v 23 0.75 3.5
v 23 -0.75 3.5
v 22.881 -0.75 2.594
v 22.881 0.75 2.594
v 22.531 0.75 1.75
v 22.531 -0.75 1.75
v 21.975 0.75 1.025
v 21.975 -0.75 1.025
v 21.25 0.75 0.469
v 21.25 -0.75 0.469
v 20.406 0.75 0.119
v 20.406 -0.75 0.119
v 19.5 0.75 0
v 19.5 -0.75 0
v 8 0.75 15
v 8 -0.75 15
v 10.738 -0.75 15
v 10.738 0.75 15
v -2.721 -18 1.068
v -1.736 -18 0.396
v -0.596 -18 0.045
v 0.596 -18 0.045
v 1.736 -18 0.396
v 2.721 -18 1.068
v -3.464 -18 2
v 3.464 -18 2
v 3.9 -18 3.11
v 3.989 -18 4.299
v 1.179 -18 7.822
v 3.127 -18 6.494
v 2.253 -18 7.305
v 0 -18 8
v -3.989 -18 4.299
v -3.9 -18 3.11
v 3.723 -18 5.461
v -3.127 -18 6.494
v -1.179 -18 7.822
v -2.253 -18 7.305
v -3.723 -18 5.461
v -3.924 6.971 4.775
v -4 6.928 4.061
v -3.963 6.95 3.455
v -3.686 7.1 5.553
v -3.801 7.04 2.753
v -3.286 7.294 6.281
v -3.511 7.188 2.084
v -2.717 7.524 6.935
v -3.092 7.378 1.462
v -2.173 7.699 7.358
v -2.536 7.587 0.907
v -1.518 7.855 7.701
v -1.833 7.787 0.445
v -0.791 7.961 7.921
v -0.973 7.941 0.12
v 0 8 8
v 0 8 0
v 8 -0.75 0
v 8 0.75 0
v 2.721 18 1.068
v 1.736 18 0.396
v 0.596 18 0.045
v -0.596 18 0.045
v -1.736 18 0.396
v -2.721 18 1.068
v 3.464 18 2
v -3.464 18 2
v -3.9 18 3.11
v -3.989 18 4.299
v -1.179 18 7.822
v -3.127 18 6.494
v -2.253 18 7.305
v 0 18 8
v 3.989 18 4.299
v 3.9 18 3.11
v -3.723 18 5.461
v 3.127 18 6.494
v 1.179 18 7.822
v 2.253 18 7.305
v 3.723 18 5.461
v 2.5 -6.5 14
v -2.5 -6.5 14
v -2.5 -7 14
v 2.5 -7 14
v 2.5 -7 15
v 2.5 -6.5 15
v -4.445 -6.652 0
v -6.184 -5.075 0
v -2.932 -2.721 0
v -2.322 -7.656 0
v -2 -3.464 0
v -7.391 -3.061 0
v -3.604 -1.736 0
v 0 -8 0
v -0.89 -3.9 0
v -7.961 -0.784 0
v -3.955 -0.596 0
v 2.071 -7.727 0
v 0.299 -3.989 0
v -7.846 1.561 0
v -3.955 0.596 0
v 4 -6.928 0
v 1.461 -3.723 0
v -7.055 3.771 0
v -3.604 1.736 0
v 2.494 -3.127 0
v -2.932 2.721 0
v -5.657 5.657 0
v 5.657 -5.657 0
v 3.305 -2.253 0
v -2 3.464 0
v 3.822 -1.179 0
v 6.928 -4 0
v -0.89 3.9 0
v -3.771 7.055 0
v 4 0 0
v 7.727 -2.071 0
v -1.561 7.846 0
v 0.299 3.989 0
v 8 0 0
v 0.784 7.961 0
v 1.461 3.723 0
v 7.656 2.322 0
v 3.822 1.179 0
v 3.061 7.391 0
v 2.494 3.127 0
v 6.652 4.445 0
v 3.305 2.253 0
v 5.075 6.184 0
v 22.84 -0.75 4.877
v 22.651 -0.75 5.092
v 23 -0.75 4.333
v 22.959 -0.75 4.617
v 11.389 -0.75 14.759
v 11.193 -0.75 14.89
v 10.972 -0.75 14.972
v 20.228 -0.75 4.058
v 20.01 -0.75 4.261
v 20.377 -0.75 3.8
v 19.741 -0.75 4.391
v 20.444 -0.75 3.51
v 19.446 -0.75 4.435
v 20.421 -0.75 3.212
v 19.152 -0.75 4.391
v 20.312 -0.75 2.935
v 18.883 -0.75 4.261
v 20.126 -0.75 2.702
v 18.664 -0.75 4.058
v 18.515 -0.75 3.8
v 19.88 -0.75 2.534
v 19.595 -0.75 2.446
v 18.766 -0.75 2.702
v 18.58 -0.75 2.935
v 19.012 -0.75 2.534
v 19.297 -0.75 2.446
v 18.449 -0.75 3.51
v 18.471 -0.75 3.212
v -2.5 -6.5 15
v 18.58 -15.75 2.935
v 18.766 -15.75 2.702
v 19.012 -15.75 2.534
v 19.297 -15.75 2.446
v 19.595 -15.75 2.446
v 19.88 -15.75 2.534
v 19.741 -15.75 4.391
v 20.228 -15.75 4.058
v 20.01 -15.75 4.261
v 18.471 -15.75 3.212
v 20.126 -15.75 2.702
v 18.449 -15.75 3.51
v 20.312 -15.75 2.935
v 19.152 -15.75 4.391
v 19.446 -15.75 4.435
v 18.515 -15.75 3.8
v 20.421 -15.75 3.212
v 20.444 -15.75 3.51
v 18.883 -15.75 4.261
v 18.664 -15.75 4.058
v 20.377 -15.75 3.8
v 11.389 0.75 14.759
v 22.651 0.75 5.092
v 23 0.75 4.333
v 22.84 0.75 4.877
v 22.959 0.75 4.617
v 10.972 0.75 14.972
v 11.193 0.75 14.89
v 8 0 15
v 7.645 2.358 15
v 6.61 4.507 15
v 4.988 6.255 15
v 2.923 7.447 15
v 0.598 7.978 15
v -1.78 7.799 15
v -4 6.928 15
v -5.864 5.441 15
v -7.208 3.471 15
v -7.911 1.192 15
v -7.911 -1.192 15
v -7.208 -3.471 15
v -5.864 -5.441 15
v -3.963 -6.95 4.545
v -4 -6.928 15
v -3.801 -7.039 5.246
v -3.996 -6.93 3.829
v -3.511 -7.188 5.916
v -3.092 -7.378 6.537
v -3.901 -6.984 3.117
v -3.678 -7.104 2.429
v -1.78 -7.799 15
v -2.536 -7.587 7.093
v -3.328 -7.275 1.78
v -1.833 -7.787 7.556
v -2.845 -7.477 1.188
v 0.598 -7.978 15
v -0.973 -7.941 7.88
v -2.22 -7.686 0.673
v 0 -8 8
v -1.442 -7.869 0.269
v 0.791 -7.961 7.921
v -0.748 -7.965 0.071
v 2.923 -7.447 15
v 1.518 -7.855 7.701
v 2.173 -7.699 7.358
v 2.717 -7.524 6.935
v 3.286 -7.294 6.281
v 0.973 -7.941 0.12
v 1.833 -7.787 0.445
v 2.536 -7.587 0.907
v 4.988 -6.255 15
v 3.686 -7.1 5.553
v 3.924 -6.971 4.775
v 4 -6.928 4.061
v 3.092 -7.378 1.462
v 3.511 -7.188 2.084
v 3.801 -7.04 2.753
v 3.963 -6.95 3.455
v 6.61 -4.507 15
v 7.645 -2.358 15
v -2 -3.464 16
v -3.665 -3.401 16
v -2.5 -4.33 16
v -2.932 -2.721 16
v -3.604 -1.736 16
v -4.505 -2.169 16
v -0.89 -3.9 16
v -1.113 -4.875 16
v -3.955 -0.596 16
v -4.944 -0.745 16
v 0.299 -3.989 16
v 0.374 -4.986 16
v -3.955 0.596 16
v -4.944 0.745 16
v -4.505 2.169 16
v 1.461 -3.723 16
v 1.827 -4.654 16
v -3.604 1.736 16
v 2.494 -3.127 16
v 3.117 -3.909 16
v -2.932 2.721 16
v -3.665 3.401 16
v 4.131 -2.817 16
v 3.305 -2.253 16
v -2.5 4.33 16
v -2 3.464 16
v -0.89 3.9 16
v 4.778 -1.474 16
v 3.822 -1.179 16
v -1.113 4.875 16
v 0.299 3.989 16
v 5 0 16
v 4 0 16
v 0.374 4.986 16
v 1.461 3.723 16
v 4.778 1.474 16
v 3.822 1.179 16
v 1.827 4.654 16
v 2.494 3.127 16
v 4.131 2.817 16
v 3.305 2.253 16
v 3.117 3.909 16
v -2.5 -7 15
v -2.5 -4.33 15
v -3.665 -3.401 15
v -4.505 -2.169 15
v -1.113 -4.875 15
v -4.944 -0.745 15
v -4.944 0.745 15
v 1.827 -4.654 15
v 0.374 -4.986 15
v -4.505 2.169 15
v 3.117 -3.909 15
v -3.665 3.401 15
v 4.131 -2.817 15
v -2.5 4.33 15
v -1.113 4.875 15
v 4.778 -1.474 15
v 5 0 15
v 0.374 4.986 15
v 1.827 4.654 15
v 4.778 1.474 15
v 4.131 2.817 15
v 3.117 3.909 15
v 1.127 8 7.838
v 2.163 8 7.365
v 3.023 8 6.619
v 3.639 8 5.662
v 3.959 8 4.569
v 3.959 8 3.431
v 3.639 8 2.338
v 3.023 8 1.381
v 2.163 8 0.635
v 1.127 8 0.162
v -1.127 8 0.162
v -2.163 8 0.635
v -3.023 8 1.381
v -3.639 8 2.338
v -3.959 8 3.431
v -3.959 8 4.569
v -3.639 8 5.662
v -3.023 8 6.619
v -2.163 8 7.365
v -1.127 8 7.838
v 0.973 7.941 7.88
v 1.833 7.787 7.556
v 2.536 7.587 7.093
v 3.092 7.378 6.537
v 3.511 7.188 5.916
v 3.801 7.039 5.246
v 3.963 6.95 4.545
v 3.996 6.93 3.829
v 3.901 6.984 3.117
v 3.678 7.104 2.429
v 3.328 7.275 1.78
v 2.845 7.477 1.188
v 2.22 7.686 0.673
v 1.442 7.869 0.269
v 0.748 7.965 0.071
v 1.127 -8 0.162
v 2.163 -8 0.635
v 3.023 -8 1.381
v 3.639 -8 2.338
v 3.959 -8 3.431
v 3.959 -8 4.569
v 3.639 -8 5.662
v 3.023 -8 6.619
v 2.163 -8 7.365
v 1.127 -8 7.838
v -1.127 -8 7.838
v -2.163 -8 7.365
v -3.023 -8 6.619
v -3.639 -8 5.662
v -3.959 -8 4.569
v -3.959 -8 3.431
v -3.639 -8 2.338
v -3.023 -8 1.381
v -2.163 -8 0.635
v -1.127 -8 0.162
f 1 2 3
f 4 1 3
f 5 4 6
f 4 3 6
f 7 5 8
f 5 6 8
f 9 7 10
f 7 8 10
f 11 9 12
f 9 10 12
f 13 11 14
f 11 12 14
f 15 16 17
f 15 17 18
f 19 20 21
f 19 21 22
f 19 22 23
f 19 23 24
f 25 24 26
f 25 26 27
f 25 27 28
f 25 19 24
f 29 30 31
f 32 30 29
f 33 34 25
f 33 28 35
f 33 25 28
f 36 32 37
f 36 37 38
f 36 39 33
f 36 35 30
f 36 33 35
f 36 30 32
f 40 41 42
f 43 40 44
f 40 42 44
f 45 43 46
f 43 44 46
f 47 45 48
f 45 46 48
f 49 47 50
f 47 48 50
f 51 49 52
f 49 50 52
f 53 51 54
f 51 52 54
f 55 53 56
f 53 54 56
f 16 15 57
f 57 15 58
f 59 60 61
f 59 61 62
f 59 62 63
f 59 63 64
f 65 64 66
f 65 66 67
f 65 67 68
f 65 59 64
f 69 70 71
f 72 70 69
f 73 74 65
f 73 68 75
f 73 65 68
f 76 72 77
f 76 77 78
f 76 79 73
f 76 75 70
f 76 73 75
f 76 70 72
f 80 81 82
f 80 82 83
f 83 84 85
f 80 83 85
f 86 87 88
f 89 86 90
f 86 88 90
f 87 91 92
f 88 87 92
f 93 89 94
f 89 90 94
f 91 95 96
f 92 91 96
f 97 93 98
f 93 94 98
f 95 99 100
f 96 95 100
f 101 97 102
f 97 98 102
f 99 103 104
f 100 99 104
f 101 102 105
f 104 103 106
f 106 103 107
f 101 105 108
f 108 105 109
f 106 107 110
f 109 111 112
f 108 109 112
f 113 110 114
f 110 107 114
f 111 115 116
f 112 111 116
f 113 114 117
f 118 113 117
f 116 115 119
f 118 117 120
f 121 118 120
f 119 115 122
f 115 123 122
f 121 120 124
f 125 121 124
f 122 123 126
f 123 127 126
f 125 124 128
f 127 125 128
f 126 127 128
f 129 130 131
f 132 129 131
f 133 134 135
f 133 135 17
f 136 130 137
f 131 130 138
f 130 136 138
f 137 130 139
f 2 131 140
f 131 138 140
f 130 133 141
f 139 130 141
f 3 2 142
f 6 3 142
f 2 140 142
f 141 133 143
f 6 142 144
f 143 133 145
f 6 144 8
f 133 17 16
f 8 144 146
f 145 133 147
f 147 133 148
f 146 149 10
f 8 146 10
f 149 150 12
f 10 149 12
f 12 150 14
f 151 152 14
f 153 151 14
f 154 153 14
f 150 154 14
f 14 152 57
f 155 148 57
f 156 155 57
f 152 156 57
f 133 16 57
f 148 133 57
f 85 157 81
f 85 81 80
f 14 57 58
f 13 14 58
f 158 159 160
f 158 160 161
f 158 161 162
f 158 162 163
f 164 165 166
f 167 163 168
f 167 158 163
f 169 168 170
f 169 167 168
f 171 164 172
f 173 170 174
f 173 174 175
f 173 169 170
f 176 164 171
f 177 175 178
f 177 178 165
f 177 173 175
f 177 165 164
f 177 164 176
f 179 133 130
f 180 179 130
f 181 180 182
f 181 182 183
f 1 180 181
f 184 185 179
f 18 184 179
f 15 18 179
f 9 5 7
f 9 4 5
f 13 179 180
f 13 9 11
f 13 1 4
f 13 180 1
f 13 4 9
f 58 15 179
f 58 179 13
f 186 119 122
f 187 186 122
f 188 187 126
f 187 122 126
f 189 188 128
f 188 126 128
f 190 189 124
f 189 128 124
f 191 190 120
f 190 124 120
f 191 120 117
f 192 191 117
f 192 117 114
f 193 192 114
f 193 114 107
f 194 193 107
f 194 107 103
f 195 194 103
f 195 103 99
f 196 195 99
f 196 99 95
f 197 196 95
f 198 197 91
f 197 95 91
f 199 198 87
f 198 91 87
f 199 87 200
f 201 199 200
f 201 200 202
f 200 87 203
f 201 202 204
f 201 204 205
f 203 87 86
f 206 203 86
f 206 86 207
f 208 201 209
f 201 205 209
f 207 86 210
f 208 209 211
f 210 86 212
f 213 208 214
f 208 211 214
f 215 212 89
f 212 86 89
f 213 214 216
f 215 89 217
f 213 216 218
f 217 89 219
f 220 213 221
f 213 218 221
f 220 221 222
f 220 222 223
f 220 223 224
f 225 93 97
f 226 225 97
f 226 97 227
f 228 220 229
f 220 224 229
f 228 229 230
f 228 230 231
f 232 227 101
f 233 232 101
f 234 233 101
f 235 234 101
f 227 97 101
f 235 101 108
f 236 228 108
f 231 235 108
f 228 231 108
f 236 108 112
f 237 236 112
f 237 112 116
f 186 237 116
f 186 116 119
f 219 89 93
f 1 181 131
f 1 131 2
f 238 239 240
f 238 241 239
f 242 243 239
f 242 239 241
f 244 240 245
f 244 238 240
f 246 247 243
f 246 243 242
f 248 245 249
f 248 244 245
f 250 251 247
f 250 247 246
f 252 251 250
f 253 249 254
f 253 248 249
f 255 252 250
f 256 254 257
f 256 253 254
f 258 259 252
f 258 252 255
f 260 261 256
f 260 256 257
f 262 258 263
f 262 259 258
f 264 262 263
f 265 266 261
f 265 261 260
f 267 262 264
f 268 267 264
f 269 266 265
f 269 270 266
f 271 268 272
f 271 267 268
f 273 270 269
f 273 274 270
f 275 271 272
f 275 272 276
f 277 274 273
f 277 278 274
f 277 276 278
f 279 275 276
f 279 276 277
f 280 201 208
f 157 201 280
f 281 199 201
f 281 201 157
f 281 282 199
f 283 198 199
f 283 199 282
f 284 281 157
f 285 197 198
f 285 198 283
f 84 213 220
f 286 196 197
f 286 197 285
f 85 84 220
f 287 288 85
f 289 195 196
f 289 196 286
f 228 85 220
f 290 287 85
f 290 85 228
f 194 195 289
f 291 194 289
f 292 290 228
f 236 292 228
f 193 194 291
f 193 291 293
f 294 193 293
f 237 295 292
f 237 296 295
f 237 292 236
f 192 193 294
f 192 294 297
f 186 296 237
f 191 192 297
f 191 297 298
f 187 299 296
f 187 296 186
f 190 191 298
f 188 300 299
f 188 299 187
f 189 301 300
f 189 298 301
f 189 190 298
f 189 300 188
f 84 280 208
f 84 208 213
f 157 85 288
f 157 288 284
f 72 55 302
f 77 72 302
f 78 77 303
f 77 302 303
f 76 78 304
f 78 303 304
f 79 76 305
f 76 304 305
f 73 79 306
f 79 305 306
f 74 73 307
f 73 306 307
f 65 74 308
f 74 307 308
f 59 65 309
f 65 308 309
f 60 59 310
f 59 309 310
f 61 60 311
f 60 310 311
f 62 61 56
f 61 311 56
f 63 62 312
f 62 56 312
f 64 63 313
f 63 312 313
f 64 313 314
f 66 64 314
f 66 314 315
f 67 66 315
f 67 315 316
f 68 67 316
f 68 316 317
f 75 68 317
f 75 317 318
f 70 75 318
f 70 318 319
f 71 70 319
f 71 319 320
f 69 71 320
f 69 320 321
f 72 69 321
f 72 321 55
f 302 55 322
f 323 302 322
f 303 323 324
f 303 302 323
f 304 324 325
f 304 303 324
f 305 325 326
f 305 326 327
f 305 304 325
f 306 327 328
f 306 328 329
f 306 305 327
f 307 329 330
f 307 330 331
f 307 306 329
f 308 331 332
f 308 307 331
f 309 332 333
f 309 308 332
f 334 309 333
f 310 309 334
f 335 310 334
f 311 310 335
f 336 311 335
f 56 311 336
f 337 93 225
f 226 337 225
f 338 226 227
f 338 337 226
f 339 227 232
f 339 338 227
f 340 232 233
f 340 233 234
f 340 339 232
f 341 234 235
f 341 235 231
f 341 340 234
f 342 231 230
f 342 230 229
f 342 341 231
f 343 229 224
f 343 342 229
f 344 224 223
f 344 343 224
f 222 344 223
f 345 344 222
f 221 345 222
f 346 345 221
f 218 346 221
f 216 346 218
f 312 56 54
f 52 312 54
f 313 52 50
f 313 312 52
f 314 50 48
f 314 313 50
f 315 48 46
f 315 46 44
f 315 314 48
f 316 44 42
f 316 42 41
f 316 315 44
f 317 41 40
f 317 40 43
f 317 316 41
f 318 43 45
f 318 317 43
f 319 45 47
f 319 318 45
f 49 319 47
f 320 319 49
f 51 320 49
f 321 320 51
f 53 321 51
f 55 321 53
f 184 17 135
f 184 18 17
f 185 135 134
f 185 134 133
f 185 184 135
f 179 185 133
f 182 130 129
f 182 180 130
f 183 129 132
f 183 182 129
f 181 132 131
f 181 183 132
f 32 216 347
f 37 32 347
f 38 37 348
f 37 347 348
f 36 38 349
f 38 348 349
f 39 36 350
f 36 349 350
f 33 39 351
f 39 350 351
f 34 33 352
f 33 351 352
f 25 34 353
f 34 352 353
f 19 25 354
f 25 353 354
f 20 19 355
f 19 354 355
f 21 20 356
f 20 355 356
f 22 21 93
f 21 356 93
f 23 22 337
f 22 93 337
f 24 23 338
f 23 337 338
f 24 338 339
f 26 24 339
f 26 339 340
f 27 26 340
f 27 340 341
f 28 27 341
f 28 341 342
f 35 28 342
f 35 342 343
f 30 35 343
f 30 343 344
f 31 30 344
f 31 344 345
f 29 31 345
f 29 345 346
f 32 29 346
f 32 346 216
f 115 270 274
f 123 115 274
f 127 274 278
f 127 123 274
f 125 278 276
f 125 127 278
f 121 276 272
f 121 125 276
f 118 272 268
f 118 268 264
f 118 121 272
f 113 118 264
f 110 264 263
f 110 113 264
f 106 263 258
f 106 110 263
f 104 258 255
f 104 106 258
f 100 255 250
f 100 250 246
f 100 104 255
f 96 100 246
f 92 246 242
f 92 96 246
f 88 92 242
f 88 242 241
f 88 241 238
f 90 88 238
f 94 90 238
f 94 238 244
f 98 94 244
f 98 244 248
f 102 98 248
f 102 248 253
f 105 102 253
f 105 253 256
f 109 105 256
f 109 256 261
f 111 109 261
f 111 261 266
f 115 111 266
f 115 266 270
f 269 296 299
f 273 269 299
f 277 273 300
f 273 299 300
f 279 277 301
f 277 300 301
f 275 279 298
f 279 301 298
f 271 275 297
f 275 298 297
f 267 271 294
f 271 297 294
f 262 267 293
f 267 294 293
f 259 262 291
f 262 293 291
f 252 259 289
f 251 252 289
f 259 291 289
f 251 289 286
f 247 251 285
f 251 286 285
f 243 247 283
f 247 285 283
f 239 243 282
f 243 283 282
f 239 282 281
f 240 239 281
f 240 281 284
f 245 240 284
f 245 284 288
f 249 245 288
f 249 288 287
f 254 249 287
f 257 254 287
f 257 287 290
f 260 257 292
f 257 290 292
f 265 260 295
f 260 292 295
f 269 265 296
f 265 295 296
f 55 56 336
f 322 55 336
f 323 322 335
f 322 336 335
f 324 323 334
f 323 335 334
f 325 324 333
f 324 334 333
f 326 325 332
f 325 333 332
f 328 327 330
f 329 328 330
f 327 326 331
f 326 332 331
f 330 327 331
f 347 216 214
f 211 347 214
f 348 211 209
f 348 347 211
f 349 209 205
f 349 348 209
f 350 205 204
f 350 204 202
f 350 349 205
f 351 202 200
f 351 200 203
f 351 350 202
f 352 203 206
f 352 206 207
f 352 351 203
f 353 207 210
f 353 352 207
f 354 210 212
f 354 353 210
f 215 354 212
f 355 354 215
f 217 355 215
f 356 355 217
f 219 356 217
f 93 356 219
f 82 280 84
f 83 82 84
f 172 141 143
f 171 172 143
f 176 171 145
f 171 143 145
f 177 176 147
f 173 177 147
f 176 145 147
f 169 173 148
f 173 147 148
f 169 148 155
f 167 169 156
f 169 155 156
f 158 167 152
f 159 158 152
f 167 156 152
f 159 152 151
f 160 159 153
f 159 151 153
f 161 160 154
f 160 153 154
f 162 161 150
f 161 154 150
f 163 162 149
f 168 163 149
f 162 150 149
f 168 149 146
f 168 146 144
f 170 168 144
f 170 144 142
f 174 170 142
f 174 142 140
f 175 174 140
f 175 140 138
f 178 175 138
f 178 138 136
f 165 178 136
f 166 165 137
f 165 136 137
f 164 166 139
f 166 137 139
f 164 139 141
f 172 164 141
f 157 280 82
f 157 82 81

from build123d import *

# Parameters (mm, degrees)
SKETCH1_R                            = 8
BOSS_EXTRUDE1_DEPTH                  = 15
SKETCH2_R                            = 5
SKETCH2_R_2                          = 4
BOSS_EXTRUDE2_DEPTH                  = 1
CUT_EXTRUDE1_START                   = -15
SKETCH3_R                            = 4
CUT_EXTRUDE1_DEPTH                   = 15
SKETCH4_R                            = 4
BOSS_EXTRUDE3_DEPTH                  = 10
BOSS_EXTRUDE3_DIRECTION_2_REACH      = 26
BOSS_EXTRUDE3_DIRECTION_2_END_RADIUS = 8
SKETCH6_R                            = 4
BOSS_EXTRUDE4_DEPTH                  = 10
BOSS_EXTRUDE4_DIRECTION_2_REACH      = 33.559
BOSS_EXTRUDE4_DIRECTION_2_END_RADIUS = 8
SKETCH7_W                            = 15
SKETCH7_H                            = 1.5
BOSS_EXTRUDE5_DEPTH                  = 15
CUT_EXTRUDE2_DEPTH                   = 15
CUT_EXTRUDE3_DEPTH                   = 15
FILLET1_R                            = 1
FILLET2_R                            = 1
SKETCH12_R                           = 1
BOSS_EXTRUDE6_DEPTH                  = 15
SKETCH13_W                           = 5
SKETCH13_H                           = 0.5
CUT_EXTRUDE4_DEPTH                   = 1


with BuildPart() as part:
    # Sketch1 → Boss-Extrude1 (new body)
    with BuildSketch(Plane.XY):
        Circle(SKETCH1_R)
    extrude(amount=BOSS_EXTRUDE1_DEPTH)

    # Sketch2 → Boss-Extrude2 (add)
    with BuildSketch(Plane.XY.offset(15)):
        Circle(SKETCH2_R)
        Circle(SKETCH2_R_2, mode=Mode.SUBTRACT)
    extrude(amount=BOSS_EXTRUDE2_DEPTH)

    # Sketch3 → Cut-Extrude1 (cut)
    with BuildSketch(Plane.XY.offset(15).offset(CUT_EXTRUDE1_START)):
        Circle(SKETCH3_R)
    extrude(amount=CUT_EXTRUDE1_DEPTH, mode=Mode.SUBTRACT)

    # Sketch6 → Boss-Extrude4 (add)
    with BuildSketch(Plane(origin=(0, -8, 0), x_dir=(-1, 0, 0), z_dir=(0, -1, 0))):
        with Locations(Location((0, -4, 0), (0, 0, 270))):
            Circle(SKETCH6_R)
    extrude(amount=BOSS_EXTRUDE4_DEPTH)

    # Boss-Extrude4 direction 2: up to this cylinder (the profile starts outside it)
    boss_extrude4_direction_2_end = Plane(origin=(0, 0, 4), z_dir=(0, 0, -1)) * Cylinder(BOSS_EXTRUDE4_DIRECTION_2_END_RADIUS, 84.118, mode=Mode.PRIVATE)
    # Sketch6 → Boss-Extrude4 direction 2 (add, up to the surface)
    with BuildSketch(Plane(origin=(0, -8, 0), x_dir=(-1, 0, 0), z_dir=(0, -1, 0)), mode=Mode.PRIVATE) as boss_extrude4_direction_2_sk1:
        with Locations(Location((0, -4, 0), (0, 0, 270))):
            Circle(SKETCH6_R)
    boss_extrude4_direction_2_tool1 = extrude(boss_extrude4_direction_2_sk1.sketch, amount=-BOSS_EXTRUDE4_DIRECTION_2_REACH, mode=Mode.PRIVATE) - boss_extrude4_direction_2_end
    add(boss_extrude4_direction_2_tool1.solids().sort_by_distance((0, -8, 4))[0])
    add(boss_extrude4_direction_2_tool1.solids().sort_by_distance((0, -8, 4))[1])

    # Sketch13 → Cut-Extrude4 (cut)
    with BuildSketch(Plane.XY.offset(15)):
        with Locations((0, -6.75)):
            Rectangle(SKETCH13_W, SKETCH13_H)
    extrude(amount=-CUT_EXTRUDE4_DEPTH, mode=Mode.SUBTRACT)


with BuildPart() as body_2:
    # Sketch4 → Boss-Extrude3 (new body)
    with BuildSketch(Plane(origin=(0, 8, 0), x_dir=(1, 0, 0), z_dir=(0, 1, 0))):
        with Locations(Location((0, -4, 0), (0, 0, 270))):
            Circle(SKETCH4_R)
    extrude(amount=BOSS_EXTRUDE3_DEPTH)

    # Boss-Extrude3 direction 2: up to this cylinder (the profile starts outside it)
    boss_extrude3_direction_2_end = Plane(origin=(0, 0, 4), z_dir=(0, 0, -1)) * Cylinder(BOSS_EXTRUDE3_DIRECTION_2_END_RADIUS, 69, mode=Mode.PRIVATE)
    # Sketch4 → Boss-Extrude3 direction 2 (add, up to the surface)
    with BuildSketch(Plane(origin=(0, 8, 0), x_dir=(1, 0, 0), z_dir=(0, 1, 0)), mode=Mode.PRIVATE) as boss_extrude3_direction_2_sk1:
        with Locations(Location((0, -4, 0), (0, 0, 270))):
            Circle(SKETCH4_R)
    boss_extrude3_direction_2_tool1 = extrude(boss_extrude3_direction_2_sk1.sketch, amount=-BOSS_EXTRUDE3_DIRECTION_2_REACH, mode=Mode.PRIVATE) - boss_extrude3_direction_2_end
    add(boss_extrude3_direction_2_tool1.solids().sort_by_distance((0, 8, 4))[0])
    add(boss_extrude3_direction_2_tool1.solids().sort_by_distance((0, 8, 4))[1])


with BuildPart() as body_3:
    # Sketch7 → Boss-Extrude5 (new body)
    with BuildSketch(Plane(origin=(8, 0, 0), x_dir=(0, 0, -1), z_dir=(1, 0, 0))):
        with Locations((-7.5, 0)):
            Rectangle(SKETCH7_W, SKETCH7_H)
    extrude(amount=BOSS_EXTRUDE5_DEPTH)

    # Sketch9 → Cut-Extrude2 (cut)
    with BuildSketch(Plane.XZ.offset(0.75)):
        with BuildLine():
            ThreePointArc((23, 3.5), (21.974873734, 1.025126266), (19.5, 0))
            Line((19.5, 0), (23, 0))
            Line((23, 0), (23, 3.5))
        make_face()
    extrude(amount=-CUT_EXTRUDE2_DEPTH, mode=Mode.SUBTRACT)

    # Sketch11 → Cut-Extrude3 (cut)
    with BuildSketch(Plane(origin=(0, -0.75, 0), x_dir=(-1, 0, 0), z_dir=(0, -1, 0))):
        Polygon((-23, -15), (-11.108053079, -15), (-23, -4.792841708), align=None)
    extrude(amount=-CUT_EXTRUDE3_DEPTH, mode=Mode.SUBTRACT)

    # Fillet1
    fillet1_edges = [body_3.edges().sort_by_distance(p)[0] for p in [
        (11.108053079, 0, 15),
    ]]
    fillet(fillet1_edges, radius=FILLET1_R)

    # Fillet2
    fillet2_edges = [body_3.edges().sort_by_distance(p)[0] for p in [
        (23, 0, 4.792841708),
    ]]
    fillet(fillet2_edges, radius=FILLET2_R)

    # Sketch12 → Boss-Extrude6 (add)
    with BuildSketch(Plane.XZ.offset(0.75)):
        with Locations(Location((19.446318933, 3.434994956, 0), (0, 0, 90))):
            Circle(SKETCH12_R)
    extrude(amount=BOSS_EXTRUDE6_DEPTH)


solid = Compound([part.part, body_2.part, body_3.part])
